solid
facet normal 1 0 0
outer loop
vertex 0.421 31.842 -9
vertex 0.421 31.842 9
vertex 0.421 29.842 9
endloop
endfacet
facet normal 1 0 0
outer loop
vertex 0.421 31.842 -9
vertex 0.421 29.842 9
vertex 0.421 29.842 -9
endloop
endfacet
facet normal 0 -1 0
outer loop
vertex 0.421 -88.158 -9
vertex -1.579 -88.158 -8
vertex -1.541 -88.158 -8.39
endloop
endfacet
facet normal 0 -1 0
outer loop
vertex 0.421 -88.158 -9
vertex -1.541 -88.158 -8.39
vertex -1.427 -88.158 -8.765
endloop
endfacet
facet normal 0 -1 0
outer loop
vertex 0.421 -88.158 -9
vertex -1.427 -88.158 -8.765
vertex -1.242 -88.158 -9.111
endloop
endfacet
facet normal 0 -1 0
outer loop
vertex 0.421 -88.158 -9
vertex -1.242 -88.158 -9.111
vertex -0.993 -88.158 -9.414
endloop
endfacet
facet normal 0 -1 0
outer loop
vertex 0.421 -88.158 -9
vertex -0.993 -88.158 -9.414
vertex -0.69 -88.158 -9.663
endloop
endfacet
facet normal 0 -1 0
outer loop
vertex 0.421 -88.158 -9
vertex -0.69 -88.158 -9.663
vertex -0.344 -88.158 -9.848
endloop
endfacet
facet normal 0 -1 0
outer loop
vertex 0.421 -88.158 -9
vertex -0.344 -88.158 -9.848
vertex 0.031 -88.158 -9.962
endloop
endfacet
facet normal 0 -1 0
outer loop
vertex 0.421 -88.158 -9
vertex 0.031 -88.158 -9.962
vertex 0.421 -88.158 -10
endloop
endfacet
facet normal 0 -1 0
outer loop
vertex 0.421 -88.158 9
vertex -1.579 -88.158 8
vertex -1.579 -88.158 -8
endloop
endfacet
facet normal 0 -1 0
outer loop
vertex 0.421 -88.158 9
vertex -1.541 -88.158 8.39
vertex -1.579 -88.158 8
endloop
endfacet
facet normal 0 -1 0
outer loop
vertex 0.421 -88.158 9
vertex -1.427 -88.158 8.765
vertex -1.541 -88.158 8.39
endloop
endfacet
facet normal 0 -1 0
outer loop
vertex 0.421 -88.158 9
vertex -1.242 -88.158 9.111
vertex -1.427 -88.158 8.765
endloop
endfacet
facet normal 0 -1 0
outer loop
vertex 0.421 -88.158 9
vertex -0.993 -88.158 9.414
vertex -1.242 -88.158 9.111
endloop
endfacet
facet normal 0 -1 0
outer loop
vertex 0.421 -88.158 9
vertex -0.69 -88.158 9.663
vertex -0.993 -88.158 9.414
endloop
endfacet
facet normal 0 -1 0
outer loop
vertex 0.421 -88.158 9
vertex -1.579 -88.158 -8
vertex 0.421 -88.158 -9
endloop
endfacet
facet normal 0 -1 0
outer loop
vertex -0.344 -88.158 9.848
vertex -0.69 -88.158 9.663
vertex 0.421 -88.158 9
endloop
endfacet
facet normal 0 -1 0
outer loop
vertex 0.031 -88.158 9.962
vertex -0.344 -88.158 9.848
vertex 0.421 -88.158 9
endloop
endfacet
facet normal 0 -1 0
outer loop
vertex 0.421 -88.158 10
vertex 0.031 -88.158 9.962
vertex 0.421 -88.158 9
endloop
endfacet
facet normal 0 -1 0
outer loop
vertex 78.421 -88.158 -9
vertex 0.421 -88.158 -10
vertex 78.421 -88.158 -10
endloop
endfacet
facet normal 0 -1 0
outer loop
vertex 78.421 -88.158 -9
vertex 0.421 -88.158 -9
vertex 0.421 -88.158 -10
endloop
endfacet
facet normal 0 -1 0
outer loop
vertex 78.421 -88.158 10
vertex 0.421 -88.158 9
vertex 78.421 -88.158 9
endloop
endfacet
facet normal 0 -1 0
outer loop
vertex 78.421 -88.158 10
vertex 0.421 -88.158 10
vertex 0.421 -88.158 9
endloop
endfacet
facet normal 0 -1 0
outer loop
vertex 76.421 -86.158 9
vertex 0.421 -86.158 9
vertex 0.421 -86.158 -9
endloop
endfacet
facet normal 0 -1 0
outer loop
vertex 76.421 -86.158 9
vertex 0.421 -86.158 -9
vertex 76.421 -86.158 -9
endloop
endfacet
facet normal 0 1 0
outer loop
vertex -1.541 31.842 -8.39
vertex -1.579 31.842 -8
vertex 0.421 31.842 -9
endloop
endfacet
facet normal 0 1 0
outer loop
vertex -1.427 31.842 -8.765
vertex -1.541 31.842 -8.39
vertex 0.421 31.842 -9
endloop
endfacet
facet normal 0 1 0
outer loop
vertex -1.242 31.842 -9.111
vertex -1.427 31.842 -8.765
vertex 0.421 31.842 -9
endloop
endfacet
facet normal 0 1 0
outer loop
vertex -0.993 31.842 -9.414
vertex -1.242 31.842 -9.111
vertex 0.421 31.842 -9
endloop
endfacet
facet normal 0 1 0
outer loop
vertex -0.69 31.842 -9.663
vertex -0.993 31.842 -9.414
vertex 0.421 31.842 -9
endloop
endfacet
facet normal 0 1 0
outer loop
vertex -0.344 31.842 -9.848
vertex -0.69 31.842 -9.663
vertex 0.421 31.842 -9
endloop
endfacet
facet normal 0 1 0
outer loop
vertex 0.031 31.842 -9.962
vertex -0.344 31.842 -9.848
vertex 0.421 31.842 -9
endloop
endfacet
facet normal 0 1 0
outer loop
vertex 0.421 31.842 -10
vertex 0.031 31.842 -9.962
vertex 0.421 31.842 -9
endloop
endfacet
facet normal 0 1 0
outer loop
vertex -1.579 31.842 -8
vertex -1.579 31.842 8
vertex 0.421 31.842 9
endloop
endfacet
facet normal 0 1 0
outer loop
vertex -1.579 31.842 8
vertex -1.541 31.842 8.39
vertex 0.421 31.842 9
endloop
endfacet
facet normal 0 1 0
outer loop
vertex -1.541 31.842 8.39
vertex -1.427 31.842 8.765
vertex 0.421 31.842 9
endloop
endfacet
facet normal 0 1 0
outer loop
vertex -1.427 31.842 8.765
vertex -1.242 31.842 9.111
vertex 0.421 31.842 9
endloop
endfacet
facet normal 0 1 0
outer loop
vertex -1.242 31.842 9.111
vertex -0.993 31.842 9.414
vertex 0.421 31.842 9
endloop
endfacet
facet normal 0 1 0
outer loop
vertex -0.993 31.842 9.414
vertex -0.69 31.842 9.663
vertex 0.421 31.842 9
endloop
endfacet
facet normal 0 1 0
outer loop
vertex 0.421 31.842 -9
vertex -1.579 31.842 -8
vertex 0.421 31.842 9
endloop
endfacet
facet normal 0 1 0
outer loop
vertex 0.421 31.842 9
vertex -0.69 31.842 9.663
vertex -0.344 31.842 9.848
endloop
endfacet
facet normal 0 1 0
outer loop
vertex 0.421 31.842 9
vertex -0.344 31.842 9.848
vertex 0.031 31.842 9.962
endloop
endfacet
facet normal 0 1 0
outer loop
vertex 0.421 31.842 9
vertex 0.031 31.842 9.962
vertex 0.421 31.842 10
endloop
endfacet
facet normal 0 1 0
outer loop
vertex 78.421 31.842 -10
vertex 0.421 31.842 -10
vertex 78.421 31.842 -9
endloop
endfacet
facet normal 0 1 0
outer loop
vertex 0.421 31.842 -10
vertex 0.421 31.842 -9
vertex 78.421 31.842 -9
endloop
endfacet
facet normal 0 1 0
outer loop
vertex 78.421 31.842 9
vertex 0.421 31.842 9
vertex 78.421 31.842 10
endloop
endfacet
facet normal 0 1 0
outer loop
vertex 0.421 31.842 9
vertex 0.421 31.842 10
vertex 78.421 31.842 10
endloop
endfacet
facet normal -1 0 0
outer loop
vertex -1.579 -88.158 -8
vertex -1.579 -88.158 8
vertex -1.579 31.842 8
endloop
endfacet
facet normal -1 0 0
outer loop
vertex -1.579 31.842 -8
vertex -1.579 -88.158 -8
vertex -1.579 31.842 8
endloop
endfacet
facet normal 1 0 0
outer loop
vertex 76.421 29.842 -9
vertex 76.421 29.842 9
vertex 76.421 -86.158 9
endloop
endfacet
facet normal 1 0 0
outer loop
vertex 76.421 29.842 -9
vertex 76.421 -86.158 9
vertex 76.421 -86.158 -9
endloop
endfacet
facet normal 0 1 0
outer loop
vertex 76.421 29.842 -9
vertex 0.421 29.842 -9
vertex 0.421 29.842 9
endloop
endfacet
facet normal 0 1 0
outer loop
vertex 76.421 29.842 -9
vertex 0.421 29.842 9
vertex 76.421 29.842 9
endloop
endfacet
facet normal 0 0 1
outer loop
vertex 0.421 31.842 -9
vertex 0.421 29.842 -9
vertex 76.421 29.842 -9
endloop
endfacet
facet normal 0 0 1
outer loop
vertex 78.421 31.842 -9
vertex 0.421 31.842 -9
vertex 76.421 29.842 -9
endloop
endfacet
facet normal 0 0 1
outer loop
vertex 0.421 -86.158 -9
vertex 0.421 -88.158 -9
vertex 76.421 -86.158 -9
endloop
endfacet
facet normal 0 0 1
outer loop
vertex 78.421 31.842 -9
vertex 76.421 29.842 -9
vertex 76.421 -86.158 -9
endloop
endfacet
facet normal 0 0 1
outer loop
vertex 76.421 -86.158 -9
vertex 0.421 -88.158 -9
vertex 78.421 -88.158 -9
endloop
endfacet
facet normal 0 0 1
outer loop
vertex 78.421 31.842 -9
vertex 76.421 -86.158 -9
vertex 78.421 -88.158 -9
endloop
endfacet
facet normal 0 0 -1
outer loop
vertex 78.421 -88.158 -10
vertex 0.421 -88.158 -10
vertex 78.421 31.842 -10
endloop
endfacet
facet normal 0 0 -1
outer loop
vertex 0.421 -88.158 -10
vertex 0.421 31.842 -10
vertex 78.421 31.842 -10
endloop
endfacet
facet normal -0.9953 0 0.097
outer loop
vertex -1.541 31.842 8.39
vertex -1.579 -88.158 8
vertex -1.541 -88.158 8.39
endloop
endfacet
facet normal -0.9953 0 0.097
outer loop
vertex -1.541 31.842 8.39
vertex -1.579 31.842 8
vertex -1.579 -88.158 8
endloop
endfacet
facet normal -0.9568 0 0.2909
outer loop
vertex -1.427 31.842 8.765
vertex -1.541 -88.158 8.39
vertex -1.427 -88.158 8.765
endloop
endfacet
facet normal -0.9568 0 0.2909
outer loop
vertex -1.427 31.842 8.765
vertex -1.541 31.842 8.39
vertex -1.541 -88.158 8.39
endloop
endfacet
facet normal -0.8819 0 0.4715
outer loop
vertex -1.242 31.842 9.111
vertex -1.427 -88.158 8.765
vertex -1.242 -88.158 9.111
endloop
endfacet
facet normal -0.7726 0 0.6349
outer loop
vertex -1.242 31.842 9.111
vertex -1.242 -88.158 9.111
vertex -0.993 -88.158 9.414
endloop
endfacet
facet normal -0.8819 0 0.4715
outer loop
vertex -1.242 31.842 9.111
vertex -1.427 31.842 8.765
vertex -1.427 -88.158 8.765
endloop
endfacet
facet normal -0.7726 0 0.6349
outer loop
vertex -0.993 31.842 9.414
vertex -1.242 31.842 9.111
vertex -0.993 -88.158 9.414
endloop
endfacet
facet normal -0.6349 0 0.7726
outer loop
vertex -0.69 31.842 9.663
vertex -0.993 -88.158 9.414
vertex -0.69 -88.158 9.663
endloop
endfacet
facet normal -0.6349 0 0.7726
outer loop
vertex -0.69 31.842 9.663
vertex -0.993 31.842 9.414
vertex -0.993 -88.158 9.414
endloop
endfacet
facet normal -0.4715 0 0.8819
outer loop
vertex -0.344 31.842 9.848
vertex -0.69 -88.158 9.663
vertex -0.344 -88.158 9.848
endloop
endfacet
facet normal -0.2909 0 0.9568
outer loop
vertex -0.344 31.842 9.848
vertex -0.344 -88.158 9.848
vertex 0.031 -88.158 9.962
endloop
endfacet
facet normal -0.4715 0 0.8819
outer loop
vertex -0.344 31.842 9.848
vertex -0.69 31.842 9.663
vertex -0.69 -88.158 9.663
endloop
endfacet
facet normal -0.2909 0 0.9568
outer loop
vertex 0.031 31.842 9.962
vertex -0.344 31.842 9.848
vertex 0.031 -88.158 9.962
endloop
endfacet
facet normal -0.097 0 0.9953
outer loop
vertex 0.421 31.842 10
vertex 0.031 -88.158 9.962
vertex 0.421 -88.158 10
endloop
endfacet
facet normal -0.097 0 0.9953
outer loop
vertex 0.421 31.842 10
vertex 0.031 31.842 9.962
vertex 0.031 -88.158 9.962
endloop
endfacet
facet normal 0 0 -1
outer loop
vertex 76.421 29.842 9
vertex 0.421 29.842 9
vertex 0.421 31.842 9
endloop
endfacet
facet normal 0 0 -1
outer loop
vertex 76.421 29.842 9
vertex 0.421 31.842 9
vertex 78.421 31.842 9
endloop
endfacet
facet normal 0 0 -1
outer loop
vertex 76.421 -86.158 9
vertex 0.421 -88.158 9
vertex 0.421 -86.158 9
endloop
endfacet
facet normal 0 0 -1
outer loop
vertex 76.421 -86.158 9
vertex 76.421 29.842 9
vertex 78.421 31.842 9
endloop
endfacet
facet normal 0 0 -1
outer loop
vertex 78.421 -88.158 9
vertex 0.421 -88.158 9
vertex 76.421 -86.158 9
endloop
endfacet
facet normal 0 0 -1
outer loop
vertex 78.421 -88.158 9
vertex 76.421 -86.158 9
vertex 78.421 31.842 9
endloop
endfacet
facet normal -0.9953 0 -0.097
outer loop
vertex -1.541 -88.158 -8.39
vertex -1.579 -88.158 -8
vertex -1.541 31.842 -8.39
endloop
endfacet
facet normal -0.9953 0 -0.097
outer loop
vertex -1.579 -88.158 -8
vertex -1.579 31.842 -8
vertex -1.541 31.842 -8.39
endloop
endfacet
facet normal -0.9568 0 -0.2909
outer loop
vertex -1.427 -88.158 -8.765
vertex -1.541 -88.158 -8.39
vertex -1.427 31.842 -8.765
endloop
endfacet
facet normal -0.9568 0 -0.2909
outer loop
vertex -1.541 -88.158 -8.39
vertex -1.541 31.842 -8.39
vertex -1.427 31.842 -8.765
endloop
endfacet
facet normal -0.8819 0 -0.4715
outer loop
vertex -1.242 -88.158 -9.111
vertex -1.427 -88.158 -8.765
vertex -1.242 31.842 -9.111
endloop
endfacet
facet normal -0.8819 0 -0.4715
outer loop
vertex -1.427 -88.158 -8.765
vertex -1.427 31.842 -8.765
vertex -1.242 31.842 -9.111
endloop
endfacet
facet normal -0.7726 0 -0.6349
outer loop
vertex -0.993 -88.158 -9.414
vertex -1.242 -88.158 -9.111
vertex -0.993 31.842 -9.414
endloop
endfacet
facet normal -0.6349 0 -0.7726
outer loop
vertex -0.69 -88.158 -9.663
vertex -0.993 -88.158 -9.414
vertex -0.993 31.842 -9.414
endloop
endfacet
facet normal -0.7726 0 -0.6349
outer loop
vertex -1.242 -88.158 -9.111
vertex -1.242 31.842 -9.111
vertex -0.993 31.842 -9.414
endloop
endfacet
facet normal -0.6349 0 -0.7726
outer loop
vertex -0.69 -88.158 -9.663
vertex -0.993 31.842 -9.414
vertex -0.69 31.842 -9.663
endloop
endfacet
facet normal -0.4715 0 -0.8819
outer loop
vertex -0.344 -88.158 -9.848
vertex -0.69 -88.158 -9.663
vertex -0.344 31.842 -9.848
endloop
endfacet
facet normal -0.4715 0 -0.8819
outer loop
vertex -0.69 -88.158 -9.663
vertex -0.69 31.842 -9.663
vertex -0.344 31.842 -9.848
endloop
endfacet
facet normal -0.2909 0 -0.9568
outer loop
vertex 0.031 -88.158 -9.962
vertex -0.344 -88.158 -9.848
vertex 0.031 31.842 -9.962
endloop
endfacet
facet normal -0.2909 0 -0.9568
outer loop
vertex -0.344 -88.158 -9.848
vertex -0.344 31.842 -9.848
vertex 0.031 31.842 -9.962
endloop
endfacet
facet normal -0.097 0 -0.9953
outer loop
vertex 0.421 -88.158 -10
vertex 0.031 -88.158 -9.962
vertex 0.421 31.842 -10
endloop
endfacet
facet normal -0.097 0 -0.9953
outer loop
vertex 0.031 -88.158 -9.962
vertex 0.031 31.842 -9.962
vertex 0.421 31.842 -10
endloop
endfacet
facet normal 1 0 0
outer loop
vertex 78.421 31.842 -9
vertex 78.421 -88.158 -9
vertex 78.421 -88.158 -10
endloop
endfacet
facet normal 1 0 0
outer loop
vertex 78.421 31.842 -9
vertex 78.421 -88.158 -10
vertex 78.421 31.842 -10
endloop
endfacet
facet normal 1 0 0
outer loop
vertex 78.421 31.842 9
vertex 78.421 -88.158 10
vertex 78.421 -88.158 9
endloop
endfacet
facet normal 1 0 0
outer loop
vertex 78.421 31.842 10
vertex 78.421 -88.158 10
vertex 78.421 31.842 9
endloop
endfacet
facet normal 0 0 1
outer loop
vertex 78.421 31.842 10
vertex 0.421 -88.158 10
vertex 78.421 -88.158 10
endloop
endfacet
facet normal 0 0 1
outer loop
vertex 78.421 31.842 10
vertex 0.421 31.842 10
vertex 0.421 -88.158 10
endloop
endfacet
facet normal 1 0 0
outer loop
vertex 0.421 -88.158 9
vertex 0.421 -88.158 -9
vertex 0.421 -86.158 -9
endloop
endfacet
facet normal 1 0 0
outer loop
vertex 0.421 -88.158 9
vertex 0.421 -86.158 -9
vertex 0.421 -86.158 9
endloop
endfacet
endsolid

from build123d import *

# Parameters (mm, degrees)
SKETCH7_W           = 80
SKETCH7_H           = 120
BOSS_EXTRUDE2_DEPTH = 10
SKETCH8_W           = 78
SKETCH8_H           = 18
CUT_EXTRUDE1_DEPTH  = 2
SKETCH9_W           = 18
SKETCH9_H           = 117
CUT_EXTRUDE2_DEPTH  = 2
SKETCH10_W          = 78
SKETCH10_H          = 18
CUT_EXTRUDE3_DEPTH  = 2
FILLET1_R           = 2


with BuildPart() as part:
    # Sketch7 → Boss-Extrude2 (new, symmetric)
    with BuildSketch(Plane.XY):
        with Locations((38.421052632, -28.157894737)):
            Rectangle(SKETCH7_W, SKETCH7_H)
    extrude(amount=BOSS_EXTRUDE2_DEPTH, both=True)

    # Sketch8 → Cut-Extrude1 (cut)
    with BuildSketch(Plane(origin=(0, 31.842105263, 0), x_dir=(1, 0, 0), z_dir=(0, 1, 0))):
        with Locations((39.421052632, 0)):
            Rectangle(SKETCH8_W, SKETCH8_H)
    extrude(amount=-CUT_EXTRUDE1_DEPTH, mode=Mode.SUBTRACT)

    # Sketch9 → Cut-Extrude2 (cut)
    with BuildSketch(Plane(origin=(78.421052632, 0, 0), x_dir=(0, 0, -1), z_dir=(1, 0, 0))):
        with Locations((0, -28.657894737)):
            Rectangle(SKETCH9_W, SKETCH9_H)
    extrude(amount=-CUT_EXTRUDE2_DEPTH, mode=Mode.SUBTRACT)

    # Sketch10 → Cut-Extrude3 (cut)
    with BuildSketch(Plane.XZ.offset(88.157894737)):
        with Locations((39.421052632, 0)):
            Rectangle(SKETCH10_W, SKETCH10_H)
    extrude(amount=-CUT_EXTRUDE3_DEPTH, mode=Mode.SUBTRACT)

    # Fillet1
    fillet1_edges = [part.edges().sort_by_distance(p)[0] for p in [
        (-1.578947368, -28.157894737, 10),
        (-1.578947368, -28.157894737, -10),
    ]]
    fillet(fillet1_edges, radius=FILLET1_R)


solid = part.part
